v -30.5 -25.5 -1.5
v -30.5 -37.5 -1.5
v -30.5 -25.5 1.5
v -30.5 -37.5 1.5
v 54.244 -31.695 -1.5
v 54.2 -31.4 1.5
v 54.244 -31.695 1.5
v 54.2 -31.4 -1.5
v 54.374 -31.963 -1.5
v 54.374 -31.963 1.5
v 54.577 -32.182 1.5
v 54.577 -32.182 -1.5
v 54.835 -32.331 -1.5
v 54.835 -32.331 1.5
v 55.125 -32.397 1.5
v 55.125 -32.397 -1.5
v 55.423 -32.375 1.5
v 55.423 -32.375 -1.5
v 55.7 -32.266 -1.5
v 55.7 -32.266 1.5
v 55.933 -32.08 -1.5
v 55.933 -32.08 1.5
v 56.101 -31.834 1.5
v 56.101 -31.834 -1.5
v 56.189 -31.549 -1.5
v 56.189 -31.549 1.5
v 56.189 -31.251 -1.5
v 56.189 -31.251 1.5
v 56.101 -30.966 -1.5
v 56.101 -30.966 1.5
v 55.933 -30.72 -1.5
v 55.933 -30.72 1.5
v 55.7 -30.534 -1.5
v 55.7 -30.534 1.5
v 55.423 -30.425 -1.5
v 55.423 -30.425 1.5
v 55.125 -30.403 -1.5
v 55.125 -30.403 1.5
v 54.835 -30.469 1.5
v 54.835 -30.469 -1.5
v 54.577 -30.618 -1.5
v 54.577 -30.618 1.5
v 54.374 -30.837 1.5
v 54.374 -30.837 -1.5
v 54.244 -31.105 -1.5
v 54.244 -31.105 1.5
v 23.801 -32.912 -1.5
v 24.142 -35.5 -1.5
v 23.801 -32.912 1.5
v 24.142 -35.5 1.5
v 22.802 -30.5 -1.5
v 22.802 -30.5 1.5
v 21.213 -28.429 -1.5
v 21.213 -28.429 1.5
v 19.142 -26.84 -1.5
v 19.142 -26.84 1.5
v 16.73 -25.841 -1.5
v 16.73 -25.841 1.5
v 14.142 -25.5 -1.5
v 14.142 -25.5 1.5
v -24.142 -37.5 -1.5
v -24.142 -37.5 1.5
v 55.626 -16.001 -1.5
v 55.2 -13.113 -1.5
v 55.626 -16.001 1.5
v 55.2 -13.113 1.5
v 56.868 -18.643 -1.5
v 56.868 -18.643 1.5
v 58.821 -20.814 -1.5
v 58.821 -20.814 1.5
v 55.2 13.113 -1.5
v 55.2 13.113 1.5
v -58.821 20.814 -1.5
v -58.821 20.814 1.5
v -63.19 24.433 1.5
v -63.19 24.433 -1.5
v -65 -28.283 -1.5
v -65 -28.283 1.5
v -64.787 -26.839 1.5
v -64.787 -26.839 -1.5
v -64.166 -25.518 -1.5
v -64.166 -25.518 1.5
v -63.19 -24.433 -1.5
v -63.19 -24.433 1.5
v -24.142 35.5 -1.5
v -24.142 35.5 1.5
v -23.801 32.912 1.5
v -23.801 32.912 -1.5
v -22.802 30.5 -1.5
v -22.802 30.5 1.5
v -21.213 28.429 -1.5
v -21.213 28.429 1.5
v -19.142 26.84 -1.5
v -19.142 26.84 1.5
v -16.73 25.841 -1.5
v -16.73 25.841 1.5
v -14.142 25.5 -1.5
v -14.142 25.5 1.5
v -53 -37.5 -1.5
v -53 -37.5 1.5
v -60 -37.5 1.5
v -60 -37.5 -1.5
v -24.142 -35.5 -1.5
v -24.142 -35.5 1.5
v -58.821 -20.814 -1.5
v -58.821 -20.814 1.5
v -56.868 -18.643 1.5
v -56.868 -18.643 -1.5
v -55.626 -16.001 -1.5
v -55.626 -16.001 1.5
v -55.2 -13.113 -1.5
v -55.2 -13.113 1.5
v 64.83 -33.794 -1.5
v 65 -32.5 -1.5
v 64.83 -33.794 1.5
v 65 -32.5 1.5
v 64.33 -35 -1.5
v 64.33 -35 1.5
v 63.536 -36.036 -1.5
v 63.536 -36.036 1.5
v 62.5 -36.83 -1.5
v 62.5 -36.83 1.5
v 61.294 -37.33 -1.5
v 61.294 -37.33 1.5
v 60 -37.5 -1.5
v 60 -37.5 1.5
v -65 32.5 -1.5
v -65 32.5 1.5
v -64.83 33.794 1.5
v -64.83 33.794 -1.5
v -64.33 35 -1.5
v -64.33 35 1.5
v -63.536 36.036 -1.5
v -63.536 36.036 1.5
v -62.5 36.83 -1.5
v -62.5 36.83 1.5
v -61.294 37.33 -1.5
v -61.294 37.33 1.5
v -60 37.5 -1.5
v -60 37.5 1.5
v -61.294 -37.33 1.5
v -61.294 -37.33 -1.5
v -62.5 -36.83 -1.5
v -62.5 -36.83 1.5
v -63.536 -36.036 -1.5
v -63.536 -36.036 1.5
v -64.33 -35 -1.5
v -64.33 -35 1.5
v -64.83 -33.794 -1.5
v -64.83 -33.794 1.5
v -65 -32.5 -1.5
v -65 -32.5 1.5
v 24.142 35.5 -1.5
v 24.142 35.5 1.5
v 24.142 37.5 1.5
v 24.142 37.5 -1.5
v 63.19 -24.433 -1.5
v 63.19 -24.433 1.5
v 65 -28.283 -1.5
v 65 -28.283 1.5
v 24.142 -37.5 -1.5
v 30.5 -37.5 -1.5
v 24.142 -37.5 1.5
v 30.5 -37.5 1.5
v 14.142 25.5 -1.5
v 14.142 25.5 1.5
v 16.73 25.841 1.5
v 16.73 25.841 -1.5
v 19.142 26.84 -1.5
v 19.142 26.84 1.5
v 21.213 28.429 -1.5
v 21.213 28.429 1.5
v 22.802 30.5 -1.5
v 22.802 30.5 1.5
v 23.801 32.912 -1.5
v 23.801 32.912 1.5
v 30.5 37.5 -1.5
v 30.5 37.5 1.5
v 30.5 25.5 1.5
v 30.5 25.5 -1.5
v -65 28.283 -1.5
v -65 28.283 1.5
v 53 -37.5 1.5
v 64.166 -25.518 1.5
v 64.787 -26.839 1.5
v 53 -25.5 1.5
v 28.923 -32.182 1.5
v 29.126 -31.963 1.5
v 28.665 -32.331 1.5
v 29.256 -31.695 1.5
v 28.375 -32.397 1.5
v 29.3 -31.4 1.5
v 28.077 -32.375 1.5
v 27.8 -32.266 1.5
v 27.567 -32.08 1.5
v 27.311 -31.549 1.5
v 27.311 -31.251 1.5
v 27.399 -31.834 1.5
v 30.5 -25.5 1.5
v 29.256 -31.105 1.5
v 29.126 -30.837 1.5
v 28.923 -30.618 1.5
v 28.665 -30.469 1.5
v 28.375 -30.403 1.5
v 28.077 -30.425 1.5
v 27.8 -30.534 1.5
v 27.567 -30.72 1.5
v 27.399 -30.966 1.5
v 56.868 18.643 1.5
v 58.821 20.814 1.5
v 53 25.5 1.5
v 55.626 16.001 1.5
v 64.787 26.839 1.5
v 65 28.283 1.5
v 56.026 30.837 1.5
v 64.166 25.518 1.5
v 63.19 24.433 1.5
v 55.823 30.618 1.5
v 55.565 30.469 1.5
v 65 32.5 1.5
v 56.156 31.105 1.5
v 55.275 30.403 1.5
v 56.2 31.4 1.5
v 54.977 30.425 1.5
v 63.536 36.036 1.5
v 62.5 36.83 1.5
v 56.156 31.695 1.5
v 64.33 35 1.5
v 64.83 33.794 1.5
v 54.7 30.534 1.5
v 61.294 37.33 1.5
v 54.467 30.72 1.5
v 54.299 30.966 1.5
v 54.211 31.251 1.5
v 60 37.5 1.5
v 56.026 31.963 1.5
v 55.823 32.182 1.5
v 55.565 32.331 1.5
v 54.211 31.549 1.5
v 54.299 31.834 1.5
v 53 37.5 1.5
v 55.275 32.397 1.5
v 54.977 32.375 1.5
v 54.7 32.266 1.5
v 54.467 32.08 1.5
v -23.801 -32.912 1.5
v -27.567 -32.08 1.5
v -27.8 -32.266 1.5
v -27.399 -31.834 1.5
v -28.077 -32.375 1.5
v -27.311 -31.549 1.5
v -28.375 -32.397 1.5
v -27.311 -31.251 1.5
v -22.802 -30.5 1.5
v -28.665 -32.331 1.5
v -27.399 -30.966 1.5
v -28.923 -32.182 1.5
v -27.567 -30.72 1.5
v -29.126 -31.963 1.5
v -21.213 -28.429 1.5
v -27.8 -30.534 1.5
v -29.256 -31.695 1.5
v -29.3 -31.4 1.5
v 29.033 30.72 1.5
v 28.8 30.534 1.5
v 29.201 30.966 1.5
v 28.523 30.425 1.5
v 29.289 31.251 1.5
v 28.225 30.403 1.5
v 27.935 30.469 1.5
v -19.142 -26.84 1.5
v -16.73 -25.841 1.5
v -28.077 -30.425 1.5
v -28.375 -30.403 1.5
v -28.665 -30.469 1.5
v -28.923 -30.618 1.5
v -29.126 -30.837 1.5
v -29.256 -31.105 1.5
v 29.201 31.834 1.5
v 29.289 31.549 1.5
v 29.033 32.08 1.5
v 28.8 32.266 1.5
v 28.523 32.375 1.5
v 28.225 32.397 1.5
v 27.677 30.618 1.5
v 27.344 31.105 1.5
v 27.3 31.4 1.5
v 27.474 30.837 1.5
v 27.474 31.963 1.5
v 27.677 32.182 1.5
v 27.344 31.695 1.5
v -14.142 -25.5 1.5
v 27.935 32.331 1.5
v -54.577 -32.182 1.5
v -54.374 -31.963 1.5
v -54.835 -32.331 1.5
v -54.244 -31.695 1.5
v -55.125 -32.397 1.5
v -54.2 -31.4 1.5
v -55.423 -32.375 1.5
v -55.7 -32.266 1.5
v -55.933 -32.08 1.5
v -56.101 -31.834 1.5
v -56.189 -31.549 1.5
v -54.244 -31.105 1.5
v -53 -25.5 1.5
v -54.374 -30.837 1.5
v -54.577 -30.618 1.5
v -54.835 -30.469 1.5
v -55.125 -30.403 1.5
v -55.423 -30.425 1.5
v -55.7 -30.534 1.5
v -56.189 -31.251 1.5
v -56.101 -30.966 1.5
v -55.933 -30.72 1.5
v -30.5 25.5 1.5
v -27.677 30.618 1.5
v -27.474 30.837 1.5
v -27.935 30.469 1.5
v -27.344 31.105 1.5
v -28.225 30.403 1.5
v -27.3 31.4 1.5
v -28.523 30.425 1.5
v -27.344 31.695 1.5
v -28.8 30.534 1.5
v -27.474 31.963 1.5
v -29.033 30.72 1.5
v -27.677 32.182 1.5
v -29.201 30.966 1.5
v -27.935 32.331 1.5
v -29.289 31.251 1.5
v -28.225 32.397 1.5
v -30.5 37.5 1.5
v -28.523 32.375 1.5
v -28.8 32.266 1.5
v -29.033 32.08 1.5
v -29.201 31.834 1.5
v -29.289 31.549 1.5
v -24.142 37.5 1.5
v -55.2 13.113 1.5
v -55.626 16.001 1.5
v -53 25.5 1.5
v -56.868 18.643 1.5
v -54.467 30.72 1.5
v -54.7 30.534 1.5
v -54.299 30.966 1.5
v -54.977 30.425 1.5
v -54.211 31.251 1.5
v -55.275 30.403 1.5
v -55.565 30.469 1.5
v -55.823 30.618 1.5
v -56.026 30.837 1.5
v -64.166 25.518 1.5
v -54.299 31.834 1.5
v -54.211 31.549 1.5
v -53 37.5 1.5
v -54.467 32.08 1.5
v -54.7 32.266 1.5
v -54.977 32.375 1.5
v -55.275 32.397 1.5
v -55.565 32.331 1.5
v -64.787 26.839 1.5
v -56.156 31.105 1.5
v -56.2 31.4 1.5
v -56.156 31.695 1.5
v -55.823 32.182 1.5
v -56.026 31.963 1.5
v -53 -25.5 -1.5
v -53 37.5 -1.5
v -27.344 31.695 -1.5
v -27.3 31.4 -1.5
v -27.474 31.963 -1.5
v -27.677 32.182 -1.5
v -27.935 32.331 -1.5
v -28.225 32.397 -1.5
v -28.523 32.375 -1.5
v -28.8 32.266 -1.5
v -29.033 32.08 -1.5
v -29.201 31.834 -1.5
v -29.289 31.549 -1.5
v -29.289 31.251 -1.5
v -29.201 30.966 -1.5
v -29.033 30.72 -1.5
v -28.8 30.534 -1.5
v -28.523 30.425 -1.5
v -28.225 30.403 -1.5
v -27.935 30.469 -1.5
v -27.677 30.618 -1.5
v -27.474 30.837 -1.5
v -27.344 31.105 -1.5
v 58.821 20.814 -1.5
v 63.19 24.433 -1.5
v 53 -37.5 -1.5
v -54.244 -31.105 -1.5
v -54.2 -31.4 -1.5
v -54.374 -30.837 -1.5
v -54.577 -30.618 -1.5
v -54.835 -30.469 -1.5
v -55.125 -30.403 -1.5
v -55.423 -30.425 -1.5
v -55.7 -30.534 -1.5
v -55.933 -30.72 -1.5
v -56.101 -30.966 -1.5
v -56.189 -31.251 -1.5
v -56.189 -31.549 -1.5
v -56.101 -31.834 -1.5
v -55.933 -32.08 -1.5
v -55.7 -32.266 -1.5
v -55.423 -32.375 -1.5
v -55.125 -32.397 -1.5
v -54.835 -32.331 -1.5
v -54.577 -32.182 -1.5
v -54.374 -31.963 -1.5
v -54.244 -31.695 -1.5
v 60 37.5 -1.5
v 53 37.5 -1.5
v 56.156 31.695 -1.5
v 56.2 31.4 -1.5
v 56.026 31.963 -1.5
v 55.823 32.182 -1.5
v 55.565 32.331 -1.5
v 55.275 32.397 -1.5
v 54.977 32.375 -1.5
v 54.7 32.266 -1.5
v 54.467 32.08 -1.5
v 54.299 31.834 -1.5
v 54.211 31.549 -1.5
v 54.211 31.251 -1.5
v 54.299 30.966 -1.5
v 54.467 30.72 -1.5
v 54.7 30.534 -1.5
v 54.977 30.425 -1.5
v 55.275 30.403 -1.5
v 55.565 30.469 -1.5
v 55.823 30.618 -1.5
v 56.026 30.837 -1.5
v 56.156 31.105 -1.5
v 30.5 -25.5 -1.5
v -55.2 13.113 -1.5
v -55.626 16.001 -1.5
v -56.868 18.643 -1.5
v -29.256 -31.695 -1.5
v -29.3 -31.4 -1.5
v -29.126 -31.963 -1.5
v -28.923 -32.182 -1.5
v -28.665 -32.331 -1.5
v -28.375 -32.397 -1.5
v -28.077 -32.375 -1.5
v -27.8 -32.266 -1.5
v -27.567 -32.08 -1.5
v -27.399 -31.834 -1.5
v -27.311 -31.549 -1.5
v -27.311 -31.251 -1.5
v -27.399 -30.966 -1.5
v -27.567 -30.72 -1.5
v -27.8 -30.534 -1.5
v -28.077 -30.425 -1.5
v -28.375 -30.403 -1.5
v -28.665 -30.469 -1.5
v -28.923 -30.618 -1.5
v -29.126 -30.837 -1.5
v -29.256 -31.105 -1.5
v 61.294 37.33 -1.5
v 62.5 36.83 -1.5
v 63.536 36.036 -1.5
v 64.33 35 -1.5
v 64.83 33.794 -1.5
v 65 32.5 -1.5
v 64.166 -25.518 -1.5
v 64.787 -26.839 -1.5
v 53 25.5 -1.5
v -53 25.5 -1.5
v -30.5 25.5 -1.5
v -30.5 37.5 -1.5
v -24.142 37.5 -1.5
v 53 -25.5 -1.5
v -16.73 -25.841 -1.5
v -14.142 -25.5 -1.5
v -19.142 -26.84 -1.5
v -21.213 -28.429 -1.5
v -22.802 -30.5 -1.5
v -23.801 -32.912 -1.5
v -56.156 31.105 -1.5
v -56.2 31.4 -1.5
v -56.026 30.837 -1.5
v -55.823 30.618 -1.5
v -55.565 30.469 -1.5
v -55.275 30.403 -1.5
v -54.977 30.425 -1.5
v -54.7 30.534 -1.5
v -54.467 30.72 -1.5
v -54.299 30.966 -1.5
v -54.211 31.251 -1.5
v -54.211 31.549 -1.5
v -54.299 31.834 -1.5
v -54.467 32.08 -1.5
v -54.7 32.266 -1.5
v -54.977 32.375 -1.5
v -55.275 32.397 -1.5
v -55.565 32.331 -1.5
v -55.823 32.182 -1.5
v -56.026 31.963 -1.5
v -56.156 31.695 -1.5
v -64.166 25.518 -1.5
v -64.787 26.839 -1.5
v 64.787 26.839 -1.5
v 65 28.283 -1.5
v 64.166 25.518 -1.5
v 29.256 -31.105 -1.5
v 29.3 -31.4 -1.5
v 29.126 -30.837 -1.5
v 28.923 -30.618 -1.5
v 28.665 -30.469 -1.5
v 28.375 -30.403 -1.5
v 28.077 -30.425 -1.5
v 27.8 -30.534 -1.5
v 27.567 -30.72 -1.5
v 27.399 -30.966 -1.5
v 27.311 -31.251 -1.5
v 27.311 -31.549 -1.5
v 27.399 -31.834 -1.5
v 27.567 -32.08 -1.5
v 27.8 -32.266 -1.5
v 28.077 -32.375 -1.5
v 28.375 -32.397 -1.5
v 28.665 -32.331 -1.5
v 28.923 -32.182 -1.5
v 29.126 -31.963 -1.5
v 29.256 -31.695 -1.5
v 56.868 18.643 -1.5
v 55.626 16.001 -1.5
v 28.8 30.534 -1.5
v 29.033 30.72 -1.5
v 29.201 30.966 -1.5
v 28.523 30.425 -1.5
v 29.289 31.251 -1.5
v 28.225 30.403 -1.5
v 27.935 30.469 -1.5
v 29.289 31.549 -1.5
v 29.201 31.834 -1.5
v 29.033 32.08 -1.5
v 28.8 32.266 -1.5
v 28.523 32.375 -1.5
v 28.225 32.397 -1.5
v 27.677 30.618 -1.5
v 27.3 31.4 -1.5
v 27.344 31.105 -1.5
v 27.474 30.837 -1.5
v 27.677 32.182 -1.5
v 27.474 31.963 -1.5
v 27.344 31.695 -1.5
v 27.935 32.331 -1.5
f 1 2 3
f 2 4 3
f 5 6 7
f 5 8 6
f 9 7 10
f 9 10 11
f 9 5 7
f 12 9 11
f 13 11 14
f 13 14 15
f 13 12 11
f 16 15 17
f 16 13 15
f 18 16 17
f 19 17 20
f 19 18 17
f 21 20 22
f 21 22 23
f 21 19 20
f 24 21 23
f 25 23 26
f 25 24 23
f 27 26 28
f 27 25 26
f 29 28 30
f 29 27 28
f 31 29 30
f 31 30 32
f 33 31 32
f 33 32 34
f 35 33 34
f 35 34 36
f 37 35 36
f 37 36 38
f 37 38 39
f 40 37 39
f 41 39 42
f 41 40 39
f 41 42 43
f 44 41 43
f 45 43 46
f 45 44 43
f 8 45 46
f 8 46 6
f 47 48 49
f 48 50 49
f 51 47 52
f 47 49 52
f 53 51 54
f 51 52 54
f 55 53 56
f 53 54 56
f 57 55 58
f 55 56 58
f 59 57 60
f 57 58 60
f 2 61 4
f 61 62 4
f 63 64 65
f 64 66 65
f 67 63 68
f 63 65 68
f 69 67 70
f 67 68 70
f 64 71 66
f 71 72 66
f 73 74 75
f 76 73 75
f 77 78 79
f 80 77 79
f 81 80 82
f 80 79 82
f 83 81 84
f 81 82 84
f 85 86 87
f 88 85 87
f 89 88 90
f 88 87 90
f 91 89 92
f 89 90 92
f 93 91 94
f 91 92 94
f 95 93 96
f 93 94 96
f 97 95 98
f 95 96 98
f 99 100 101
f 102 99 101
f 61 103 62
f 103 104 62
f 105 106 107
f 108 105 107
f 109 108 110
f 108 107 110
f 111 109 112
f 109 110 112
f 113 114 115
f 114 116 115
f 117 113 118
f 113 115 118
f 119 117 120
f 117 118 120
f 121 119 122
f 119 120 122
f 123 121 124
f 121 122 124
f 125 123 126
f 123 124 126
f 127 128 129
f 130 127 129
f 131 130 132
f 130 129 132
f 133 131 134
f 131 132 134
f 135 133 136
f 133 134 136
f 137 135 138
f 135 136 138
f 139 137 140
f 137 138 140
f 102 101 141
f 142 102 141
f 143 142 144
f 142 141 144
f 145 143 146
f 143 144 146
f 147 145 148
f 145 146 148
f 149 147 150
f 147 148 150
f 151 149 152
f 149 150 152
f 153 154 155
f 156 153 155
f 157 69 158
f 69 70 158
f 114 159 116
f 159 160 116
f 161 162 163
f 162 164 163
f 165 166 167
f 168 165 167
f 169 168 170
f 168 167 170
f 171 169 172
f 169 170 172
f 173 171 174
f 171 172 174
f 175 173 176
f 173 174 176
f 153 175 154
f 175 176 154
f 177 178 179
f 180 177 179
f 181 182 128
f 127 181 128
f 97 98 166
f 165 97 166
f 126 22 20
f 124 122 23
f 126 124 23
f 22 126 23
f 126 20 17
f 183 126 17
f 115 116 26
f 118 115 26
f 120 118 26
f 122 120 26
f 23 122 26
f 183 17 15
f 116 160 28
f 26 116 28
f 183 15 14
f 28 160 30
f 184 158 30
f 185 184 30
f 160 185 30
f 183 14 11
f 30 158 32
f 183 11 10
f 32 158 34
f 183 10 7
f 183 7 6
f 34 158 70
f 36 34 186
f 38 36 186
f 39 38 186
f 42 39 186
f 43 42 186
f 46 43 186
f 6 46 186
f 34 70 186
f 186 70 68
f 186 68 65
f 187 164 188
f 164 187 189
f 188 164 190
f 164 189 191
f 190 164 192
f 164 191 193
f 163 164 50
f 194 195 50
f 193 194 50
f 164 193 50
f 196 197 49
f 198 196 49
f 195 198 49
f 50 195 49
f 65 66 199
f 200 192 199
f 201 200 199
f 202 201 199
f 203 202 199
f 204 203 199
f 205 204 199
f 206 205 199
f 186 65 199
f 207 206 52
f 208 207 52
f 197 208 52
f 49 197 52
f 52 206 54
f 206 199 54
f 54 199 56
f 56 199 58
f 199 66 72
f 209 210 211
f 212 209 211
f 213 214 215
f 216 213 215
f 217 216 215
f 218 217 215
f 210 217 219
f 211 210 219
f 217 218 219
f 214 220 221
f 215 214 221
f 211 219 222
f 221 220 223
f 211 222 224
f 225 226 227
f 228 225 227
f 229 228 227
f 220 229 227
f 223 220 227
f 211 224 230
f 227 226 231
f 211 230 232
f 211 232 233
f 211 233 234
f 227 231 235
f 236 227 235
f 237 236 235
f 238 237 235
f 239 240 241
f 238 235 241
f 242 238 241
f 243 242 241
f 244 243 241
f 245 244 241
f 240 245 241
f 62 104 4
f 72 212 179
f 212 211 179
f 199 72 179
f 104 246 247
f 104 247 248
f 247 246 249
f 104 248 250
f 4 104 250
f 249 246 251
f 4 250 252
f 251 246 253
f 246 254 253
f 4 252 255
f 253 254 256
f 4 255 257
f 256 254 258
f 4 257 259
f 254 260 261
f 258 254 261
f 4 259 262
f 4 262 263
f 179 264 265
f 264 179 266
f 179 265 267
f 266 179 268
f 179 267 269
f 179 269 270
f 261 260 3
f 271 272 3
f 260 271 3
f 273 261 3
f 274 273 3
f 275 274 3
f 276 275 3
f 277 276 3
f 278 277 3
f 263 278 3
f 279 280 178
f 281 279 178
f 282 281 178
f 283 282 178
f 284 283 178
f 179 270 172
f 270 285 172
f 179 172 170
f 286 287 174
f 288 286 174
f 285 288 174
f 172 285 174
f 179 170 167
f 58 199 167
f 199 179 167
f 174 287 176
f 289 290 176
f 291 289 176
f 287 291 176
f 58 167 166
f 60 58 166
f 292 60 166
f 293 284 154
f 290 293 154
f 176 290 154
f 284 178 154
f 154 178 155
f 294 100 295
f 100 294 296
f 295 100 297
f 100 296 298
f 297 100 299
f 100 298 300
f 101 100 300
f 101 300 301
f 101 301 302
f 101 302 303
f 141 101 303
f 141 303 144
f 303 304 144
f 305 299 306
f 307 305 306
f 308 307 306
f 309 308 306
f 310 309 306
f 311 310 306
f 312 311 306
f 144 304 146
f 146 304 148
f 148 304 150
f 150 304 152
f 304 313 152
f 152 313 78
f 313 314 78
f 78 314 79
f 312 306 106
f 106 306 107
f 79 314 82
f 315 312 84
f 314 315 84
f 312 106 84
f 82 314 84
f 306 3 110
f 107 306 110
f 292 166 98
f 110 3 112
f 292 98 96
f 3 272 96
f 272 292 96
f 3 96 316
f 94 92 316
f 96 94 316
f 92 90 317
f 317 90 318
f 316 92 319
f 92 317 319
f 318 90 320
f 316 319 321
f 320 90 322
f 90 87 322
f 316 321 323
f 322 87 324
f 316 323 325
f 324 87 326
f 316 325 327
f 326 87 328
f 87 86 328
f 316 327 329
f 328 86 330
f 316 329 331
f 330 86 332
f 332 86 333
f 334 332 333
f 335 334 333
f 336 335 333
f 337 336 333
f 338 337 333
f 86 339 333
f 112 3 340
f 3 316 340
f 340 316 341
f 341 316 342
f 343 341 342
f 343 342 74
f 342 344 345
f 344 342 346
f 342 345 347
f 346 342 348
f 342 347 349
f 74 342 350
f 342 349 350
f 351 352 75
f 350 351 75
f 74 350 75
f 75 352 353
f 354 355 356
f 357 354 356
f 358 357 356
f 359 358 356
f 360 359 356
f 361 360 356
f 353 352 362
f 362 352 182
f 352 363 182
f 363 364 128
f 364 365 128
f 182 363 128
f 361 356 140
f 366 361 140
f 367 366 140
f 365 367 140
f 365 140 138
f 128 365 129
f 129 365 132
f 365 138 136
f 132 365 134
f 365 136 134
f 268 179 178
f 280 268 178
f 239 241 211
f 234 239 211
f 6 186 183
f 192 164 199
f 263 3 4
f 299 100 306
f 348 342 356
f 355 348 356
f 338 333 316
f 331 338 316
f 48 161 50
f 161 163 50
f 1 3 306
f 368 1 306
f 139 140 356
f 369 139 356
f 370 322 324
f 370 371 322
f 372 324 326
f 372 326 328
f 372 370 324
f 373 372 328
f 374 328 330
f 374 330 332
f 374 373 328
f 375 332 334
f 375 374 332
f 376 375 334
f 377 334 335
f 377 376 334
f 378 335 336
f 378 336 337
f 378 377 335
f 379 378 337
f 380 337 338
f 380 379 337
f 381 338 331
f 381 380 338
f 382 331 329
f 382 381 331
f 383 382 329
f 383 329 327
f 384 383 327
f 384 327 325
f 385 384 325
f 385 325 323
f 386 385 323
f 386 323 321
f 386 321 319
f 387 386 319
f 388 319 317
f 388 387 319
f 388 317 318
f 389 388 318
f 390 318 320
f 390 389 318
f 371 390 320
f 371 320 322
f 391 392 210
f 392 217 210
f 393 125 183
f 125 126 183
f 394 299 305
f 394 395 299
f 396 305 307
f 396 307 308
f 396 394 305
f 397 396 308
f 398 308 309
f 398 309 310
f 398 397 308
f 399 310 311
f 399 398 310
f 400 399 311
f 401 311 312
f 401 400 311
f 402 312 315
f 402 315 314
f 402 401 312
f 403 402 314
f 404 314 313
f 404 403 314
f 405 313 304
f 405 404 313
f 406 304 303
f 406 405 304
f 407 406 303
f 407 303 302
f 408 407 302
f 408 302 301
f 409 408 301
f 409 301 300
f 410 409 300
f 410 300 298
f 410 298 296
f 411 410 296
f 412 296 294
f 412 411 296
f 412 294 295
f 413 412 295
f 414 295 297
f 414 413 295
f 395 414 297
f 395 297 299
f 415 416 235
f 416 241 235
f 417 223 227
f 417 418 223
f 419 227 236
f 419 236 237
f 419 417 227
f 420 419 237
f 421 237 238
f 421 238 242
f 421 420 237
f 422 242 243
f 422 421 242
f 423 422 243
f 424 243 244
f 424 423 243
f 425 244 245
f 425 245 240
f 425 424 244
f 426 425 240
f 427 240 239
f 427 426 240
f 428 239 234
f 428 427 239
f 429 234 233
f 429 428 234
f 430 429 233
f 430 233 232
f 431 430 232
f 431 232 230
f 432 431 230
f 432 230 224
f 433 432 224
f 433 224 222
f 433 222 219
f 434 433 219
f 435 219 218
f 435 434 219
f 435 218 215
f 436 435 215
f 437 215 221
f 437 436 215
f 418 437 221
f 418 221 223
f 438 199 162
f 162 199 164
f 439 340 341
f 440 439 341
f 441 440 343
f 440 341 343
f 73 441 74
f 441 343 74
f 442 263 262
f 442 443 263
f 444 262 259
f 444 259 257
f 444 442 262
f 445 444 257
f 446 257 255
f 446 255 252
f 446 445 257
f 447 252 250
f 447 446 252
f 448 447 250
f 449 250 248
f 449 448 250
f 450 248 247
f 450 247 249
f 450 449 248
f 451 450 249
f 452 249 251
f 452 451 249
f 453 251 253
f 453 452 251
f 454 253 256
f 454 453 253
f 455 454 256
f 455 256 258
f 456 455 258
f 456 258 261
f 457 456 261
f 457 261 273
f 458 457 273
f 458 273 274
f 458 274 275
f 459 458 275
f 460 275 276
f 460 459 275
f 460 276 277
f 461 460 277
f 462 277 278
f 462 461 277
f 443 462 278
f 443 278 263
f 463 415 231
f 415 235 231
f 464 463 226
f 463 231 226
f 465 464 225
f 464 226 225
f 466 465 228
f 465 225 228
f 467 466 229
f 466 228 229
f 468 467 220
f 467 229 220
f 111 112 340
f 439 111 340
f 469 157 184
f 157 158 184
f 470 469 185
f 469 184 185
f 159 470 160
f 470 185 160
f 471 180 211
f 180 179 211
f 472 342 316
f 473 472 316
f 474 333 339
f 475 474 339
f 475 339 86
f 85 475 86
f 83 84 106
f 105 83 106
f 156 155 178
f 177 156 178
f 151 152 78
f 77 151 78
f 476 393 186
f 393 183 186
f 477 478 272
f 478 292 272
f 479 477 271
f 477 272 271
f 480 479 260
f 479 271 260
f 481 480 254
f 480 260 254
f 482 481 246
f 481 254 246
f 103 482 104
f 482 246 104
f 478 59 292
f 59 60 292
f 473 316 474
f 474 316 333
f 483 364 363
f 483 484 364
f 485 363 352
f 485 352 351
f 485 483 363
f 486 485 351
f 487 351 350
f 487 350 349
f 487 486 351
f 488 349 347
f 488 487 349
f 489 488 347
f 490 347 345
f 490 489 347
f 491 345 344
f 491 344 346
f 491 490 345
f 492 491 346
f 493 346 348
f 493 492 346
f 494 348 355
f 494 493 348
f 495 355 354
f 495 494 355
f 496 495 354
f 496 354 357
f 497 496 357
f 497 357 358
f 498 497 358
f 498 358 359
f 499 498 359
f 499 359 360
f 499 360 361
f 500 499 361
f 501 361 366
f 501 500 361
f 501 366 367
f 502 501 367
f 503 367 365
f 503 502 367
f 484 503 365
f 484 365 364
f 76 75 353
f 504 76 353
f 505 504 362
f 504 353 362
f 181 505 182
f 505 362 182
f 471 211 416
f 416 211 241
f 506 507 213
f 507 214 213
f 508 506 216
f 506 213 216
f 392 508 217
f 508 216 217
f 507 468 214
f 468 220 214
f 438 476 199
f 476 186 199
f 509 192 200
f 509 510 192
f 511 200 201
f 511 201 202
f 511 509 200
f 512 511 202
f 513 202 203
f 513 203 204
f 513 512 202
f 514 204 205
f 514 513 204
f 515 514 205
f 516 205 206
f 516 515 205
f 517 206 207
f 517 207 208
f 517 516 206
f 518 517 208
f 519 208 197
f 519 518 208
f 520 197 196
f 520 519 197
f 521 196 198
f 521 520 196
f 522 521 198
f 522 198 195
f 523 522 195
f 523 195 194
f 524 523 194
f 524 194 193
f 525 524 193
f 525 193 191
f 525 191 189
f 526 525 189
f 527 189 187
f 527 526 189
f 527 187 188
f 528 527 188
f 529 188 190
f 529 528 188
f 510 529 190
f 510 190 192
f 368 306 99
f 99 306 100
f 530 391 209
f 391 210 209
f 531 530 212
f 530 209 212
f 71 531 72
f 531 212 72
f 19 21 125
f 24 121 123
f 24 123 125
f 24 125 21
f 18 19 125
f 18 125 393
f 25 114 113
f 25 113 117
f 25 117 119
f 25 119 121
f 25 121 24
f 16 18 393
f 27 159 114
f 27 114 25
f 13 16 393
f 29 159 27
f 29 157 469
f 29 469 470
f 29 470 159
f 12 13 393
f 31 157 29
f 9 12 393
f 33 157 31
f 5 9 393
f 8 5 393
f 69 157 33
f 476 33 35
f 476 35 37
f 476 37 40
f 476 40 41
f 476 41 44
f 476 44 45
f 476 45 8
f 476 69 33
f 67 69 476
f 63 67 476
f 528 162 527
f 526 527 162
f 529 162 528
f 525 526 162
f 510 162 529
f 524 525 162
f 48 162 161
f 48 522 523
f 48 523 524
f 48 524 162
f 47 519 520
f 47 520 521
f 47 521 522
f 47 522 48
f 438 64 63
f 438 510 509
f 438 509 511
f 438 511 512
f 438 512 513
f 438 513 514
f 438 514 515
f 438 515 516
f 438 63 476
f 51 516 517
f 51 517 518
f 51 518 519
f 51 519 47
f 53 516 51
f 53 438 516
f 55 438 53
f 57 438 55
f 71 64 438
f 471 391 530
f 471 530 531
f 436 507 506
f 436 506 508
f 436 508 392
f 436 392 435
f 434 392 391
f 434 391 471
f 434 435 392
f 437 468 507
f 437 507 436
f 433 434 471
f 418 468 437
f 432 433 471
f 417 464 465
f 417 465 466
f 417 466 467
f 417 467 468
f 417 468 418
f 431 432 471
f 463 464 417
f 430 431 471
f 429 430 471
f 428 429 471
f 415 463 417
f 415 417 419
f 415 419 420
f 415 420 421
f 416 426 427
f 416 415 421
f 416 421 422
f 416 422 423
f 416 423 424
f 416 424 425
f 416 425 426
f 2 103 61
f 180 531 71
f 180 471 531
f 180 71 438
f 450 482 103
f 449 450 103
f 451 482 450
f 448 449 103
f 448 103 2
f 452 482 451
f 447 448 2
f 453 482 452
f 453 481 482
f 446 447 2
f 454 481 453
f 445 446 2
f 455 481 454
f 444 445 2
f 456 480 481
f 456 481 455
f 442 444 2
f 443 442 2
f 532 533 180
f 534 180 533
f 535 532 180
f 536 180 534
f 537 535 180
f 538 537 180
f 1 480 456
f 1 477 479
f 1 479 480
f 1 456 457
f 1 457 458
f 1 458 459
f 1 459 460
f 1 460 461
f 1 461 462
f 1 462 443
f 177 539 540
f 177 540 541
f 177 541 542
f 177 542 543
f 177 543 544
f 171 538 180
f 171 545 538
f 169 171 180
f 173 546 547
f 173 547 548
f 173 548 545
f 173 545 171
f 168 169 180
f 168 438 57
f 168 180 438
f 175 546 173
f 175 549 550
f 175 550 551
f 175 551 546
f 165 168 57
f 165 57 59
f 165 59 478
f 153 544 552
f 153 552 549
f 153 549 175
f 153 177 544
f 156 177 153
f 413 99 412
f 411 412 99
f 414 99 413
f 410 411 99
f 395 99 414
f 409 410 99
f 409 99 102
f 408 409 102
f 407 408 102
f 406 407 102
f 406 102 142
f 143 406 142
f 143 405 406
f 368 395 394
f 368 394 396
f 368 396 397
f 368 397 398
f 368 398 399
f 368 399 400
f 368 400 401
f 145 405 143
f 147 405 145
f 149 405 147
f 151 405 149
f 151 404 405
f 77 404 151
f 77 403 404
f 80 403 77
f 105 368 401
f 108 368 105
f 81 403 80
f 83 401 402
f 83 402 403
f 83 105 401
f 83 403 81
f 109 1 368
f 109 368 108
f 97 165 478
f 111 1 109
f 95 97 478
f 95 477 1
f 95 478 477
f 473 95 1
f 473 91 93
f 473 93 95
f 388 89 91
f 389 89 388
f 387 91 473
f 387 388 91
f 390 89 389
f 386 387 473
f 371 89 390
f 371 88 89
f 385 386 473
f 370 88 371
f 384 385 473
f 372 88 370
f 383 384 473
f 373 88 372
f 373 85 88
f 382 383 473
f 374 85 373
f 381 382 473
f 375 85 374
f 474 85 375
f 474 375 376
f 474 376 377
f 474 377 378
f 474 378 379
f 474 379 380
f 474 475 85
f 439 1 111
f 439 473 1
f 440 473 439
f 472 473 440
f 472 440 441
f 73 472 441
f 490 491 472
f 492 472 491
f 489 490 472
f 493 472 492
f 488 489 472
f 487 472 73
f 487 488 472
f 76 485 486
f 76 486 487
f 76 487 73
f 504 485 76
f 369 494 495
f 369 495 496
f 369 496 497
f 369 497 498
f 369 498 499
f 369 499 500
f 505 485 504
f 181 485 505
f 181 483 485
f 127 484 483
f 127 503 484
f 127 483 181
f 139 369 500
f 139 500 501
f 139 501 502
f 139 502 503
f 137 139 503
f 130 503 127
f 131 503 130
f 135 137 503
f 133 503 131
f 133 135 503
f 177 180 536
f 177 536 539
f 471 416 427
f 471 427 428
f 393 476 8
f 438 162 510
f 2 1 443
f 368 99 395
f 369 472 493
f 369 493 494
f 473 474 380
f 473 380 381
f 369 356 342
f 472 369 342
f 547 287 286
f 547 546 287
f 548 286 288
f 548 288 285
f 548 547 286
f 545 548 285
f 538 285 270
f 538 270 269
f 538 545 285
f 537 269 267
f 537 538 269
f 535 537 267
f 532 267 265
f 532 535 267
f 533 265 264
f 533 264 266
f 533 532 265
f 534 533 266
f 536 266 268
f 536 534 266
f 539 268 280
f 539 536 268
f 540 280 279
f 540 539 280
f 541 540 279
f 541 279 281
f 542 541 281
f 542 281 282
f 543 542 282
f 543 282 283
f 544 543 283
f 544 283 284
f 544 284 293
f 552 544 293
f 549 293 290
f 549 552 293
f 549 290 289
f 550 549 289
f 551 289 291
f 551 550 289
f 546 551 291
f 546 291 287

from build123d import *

# Parameters (mm, degrees)
SKETCH1_R           = 1
BOSS_EXTRUDE1_DEPTH = 1.5


with BuildPart() as part:
    # Sketch1 → Boss-Extrude1 (new, symmetric)
    with BuildSketch(Plane.XY):
        with BuildLine():
            Line((30.5, 37.5), (30.5, 25.5))
            Line((30.5, 25.5), (53, 25.5))
            Line((53, 25.5), (53, 37.5))
            Line((53, 37.5), (60, 37.5))
            ThreePointArc((60, 37.5), (63.535533906, 36.035533906), (65, 32.5))
            Line((65, 32.5), (65, 28.283390528))
            ThreePointArc((65, 28.283390528), (64.524852545, 26.15601904), (63.189716221, 24.432973612))
            Line((63.189716221, 24.432973612), (58.820567558, 20.813535857))
            ThreePointArc((58.820567558, 20.813535857), (56.15029491, 17.367445), (55.2, 13.112702024))
            Line((55.2, 13.112702024), (55.2, -13.112702024))
            ThreePointArc((55.2, -13.112702024), (56.15029491, -17.367445), (58.820567558, -20.813535857))
            Line((58.820567558, -20.813535857), (63.189716221, -24.432973612))
            ThreePointArc((63.189716221, -24.432973612), (64.524852545, -26.15601904), (65, -28.283390528))
            Line((65, -28.283390528), (65, -32.5))
            ThreePointArc((65, -32.5), (63.535533906, -36.035533906), (60, -37.5))
            Line((60, -37.5), (53, -37.5))
            Line((53, -37.5), (53, -25.5))
            Line((53, -25.5), (30.5, -25.5))
            Line((30.5, -25.5), (30.5, -37.5))
            Line((30.5, -37.5), (24.141964056, -37.5))
            Line((24.141964056, -37.5), (24.141964056, -35.5))
            ThreePointArc((24.141964056, -35.5), (21.213031868, -28.428932188), (14.141964056, -25.5))
            Line((14.141964056, -25.5), (-14.141964056, -25.5))
            ThreePointArc((-14.141964056, -25.5), (-21.213031868, -28.428932188), (-24.141964056, -35.5))
            Line((-24.141964056, -35.5), (-24.141964056, -37.5))
            Line((-24.141964056, -37.5), (-30.5, -37.5))
            Line((-30.5, -37.5), (-30.5, -25.5))
            Line((-30.5, -25.5), (-53, -25.5))
            Line((-53, -25.5), (-53, -37.5))
            Line((-53, -37.5), (-60, -37.5))
            ThreePointArc((-60, -37.5), (-63.535533906, -36.035533906), (-65, -32.5))
            Line((-65, -32.5), (-65, -28.283390528))
            ThreePointArc((-65, -28.283390528), (-64.524852545, -26.15601904), (-63.189716221, -24.432973612))
            Line((-63.189716221, -24.432973612), (-58.820567558, -20.813535857))
            ThreePointArc((-58.820567558, -20.813535857), (-56.15029491, -17.367445), (-55.2, -13.112702024))
            Line((-55.2, -13.112702024), (-55.2, 13.112702024))
            ThreePointArc((-55.2, 13.112702024), (-56.15029491, 17.367445), (-58.820567558, 20.813535857))
            Line((-58.820567558, 20.813535857), (-63.189716221, 24.432973612))
            ThreePointArc((-63.189716221, 24.432973612), (-64.524852545, 26.15601904), (-65, 28.283390528))
            Line((-65, 28.283390528), (-65, 32.5))
            ThreePointArc((-65, 32.5), (-63.535533906, 36.035533906), (-60, 37.5))
            Line((-60, 37.5), (-53, 37.5))
            Line((-53, 37.5), (-53, 25.5))
            Line((-53, 25.5), (-30.5, 25.5))
            Line((-30.5, 25.5), (-30.5, 37.5))
            Line((-30.5, 37.5), (-24.141964056, 37.5))
            Line((-24.141964056, 37.5), (-24.141964056, 35.5))
            ThreePointArc((-24.141964056, 35.5), (-21.213031868, 28.428932188), (-14.141964056, 25.5))
            Line((-14.141964056, 25.5), (14.141964056, 25.5))
            ThreePointArc((14.141964056, 25.5), (21.213031868, 28.428932188), (24.141964056, 35.5))
            Line((24.141964056, 35.5), (24.141964056, 37.5))
            Line((24.141964056, 37.5), (30.5, 37.5))
        make_face()
        with Locations((55.2, 31.4)):
            Circle(SKETCH1_R, mode=Mode.SUBTRACT)
        with Locations(Location((28.3, 31.4, 0), (0, 0, 180))):
            Circle(SKETCH1_R, mode=Mode.SUBTRACT)
        with Locations((-28.3, 31.4)):
            Circle(SKETCH1_R, mode=Mode.SUBTRACT)
        with Locations(Location((-28.3, -31.4, 0), (0, 0, 180))):
            Circle(SKETCH1_R, mode=Mode.SUBTRACT)
        with Locations((28.3, -31.4)):
            Circle(SKETCH1_R, mode=Mode.SUBTRACT)
        with Locations(Location((55.2, -31.4, 0), (0, 0, 180))):
            Circle(SKETCH1_R, mode=Mode.SUBTRACT)
        with Locations(Location((-55.2, 31.4, 0), (0, 0, 180))):
            Circle(SKETCH1_R, mode=Mode.SUBTRACT)
        with Locations((-55.2, -31.4)):
            Circle(SKETCH1_R, mode=Mode.SUBTRACT)
    extrude(amount=BOSS_EXTRUDE1_DEPTH, both=True)


solid = part.part
